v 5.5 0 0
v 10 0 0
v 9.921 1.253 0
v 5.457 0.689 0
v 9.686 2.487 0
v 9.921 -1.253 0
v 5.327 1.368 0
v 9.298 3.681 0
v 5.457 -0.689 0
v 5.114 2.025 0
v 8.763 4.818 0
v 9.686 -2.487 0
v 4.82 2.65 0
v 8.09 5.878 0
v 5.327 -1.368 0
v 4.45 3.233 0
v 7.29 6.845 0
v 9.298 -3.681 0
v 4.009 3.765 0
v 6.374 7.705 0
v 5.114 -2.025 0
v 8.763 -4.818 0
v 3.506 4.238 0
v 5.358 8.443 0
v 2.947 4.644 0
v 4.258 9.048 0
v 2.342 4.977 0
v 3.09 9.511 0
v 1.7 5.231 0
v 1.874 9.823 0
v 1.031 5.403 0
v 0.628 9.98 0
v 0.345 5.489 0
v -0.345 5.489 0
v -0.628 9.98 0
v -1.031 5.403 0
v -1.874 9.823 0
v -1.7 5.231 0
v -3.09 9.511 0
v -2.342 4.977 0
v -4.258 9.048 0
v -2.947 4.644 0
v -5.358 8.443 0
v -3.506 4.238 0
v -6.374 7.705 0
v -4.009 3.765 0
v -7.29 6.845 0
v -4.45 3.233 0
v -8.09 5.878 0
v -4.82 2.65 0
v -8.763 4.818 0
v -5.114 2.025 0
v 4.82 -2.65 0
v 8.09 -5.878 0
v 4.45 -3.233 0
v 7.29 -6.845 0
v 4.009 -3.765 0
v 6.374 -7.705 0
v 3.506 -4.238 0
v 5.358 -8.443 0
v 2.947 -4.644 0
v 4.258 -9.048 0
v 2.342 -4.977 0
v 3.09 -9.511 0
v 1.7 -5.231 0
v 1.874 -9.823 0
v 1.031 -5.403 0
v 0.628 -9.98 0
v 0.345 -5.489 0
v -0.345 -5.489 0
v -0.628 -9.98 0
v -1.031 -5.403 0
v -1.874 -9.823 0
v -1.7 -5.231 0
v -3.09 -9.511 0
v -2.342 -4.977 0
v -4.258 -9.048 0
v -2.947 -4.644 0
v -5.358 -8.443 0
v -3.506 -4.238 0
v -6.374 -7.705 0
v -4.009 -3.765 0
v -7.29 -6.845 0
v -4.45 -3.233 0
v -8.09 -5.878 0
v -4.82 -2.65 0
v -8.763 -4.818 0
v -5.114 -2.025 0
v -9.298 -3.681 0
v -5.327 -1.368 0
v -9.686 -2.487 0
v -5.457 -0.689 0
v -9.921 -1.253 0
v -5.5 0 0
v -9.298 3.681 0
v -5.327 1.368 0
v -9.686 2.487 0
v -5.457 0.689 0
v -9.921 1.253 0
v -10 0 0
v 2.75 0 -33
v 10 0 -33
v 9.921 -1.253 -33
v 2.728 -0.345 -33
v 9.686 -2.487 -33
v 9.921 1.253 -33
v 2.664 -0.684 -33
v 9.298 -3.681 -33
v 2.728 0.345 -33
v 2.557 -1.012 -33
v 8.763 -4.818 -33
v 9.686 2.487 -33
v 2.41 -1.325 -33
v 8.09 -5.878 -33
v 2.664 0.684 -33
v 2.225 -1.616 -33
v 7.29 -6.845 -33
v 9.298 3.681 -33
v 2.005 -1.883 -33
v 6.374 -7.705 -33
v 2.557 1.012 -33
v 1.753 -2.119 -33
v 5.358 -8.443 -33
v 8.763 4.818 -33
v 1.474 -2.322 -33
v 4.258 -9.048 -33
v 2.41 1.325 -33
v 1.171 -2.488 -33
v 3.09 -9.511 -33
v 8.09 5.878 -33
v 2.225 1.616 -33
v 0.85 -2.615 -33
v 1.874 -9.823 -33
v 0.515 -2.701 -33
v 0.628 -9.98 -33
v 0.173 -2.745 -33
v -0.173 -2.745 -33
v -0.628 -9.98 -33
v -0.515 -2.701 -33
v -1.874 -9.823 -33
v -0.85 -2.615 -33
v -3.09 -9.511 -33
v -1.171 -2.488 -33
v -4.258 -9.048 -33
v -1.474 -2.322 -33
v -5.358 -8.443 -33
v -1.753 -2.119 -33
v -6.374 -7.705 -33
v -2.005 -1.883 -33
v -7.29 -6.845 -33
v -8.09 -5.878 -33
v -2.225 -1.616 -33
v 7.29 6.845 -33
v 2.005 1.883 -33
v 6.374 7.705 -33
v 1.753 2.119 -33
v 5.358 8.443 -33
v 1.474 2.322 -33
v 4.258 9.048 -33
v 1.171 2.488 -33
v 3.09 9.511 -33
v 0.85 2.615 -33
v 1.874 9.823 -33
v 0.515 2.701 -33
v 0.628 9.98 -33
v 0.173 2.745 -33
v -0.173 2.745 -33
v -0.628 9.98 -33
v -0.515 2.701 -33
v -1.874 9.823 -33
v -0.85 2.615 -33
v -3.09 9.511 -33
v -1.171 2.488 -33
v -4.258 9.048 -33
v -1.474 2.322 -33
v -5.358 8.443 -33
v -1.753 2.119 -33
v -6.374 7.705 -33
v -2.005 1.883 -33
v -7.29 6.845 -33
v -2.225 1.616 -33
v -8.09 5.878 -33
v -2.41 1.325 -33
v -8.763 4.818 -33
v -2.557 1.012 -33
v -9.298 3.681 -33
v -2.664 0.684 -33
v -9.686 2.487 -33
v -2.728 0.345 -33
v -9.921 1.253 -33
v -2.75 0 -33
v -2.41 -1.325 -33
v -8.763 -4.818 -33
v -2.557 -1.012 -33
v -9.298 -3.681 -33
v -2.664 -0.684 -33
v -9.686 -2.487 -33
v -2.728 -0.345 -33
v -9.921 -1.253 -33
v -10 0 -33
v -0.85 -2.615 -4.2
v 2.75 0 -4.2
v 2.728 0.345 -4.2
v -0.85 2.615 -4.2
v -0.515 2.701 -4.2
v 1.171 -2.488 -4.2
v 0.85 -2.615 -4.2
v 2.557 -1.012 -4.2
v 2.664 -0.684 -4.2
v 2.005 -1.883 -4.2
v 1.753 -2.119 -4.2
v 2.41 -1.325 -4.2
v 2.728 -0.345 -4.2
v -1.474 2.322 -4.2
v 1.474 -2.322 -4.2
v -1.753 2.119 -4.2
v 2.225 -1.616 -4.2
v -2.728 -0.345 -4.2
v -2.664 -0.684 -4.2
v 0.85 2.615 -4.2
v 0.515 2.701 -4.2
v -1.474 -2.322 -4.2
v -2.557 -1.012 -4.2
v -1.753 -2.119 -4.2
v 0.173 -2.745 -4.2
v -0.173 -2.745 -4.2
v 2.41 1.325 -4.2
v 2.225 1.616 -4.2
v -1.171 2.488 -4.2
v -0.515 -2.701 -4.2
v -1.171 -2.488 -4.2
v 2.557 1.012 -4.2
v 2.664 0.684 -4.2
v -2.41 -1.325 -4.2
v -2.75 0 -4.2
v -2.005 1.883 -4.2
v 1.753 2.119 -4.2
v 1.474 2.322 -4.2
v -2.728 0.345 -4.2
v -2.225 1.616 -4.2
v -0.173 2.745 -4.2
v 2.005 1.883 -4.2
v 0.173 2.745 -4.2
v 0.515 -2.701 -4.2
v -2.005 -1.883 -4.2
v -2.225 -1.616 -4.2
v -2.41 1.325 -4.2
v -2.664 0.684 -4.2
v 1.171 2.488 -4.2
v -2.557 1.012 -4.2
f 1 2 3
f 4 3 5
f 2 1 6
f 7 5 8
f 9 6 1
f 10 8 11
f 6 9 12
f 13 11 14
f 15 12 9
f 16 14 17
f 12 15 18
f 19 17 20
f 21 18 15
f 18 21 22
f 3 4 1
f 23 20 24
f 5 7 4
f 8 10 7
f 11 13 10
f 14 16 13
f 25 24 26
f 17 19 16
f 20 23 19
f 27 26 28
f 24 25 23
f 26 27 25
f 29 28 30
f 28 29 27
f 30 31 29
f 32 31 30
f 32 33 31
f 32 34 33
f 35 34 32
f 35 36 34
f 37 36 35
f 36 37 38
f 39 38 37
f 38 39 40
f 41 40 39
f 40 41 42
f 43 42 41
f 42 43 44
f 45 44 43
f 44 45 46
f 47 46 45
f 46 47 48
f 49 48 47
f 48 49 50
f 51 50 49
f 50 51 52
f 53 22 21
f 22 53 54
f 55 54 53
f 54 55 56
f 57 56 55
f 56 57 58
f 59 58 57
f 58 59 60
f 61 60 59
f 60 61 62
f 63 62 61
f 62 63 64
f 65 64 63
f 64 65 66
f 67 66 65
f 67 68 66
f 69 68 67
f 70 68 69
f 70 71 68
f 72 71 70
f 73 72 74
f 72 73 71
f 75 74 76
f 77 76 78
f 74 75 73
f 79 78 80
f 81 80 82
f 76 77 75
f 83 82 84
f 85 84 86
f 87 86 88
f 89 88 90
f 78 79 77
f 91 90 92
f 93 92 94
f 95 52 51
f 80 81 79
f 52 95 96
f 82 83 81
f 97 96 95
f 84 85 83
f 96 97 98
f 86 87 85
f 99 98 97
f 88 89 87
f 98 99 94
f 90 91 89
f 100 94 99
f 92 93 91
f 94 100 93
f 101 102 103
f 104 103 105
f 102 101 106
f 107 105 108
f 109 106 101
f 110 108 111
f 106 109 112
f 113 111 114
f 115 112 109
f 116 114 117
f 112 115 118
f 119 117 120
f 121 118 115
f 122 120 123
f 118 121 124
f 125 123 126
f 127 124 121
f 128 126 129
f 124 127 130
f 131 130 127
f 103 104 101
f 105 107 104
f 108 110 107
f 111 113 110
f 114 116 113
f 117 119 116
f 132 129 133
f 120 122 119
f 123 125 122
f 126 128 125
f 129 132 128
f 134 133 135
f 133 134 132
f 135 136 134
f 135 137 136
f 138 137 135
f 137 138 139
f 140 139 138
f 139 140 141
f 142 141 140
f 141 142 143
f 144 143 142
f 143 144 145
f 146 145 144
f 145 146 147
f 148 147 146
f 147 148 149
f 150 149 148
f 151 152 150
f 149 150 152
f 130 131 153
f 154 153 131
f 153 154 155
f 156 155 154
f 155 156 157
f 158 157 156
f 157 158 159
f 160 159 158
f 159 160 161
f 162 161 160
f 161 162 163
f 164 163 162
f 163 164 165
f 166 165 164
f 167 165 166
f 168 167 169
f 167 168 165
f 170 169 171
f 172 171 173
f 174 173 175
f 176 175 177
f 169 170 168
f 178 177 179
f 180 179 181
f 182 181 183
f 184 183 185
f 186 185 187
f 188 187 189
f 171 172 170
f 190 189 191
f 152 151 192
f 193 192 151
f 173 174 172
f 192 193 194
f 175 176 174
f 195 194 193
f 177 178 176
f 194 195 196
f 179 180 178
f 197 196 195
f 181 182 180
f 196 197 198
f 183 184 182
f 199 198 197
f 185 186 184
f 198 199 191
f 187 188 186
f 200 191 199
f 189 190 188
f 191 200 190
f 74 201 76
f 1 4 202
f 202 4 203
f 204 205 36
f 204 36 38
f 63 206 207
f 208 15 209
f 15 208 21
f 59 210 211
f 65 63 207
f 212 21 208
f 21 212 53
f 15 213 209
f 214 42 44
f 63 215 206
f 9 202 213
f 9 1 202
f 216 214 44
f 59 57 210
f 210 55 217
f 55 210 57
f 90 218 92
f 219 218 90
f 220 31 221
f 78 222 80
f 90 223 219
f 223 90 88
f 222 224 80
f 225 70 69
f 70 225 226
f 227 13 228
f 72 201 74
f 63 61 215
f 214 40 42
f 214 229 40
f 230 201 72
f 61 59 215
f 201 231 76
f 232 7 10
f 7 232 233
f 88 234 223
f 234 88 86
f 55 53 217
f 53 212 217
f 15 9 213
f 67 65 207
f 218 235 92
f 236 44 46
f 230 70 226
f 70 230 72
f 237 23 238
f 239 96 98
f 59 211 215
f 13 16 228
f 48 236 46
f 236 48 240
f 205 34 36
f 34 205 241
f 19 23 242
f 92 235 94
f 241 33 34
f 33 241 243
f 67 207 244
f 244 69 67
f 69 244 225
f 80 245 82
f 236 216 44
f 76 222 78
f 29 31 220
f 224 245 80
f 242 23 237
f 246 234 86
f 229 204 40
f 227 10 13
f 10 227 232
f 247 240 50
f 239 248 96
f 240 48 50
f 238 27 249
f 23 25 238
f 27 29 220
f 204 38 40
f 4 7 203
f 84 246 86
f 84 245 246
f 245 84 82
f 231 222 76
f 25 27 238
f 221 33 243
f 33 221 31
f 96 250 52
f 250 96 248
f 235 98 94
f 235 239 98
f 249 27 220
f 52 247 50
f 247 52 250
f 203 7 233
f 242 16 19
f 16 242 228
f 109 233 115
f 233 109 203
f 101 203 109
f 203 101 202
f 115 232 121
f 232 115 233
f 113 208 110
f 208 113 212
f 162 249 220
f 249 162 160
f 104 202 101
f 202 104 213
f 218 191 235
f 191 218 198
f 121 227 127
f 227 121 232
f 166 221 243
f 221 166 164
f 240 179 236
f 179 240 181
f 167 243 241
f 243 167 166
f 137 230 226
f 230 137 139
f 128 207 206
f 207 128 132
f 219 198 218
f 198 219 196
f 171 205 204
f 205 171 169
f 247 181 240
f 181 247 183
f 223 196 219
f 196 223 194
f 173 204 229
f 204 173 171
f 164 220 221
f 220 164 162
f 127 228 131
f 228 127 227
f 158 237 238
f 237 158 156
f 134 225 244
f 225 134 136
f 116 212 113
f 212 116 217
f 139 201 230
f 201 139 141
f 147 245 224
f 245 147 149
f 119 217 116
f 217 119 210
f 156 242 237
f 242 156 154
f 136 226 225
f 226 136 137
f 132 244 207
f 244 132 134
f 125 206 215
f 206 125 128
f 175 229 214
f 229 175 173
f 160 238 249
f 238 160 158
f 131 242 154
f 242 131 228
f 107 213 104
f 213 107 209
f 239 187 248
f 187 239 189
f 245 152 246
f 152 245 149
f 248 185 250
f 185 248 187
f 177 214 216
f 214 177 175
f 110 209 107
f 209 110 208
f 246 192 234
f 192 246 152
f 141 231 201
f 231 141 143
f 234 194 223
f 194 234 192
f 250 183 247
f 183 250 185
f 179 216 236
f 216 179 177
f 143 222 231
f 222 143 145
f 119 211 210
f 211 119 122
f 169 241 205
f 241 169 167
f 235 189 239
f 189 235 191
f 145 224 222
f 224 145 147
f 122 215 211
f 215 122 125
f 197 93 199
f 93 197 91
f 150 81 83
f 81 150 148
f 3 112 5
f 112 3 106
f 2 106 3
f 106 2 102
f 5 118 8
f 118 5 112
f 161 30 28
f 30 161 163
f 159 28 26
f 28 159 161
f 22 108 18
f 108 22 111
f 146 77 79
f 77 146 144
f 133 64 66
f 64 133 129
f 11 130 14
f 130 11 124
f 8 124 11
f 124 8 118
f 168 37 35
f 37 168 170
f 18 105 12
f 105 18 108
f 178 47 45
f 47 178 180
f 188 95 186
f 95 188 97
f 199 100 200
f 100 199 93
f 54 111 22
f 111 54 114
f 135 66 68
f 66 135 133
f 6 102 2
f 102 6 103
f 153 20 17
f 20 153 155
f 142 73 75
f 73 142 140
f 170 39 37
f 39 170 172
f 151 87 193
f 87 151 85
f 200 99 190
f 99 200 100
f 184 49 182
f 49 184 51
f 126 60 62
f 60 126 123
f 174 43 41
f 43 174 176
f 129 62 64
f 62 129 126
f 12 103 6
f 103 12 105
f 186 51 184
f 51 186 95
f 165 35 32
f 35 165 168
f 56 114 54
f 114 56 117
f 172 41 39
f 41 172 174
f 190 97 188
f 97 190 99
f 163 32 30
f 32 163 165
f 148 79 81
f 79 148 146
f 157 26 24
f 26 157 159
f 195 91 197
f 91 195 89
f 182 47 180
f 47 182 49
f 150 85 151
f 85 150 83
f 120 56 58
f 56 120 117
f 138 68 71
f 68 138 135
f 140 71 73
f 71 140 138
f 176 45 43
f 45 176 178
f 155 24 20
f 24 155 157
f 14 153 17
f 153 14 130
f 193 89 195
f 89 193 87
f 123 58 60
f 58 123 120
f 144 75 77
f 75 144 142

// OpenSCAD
$fn = 50;


difference() {
	union() {
		translate(v = [0, 0, -33.0000000000]) {
			cylinder(h = 33, r = 10.0000000000);
		}
		cylinder(h = 0, r = 20.0000000000);
	}
	union() {
		translate(v = [0, 0, 0]) {
			rotate(a = [0, 0, 0]) {
				difference() {
					union() {
						#translate(v = [0, 0, -33.0000000000]) {
							cylinder(h = 33, r = 2.2500000000);
						}
						#translate(v = [0, 0, -4.2000000000]) {
							cylinder(h = 4.2000000000, r = 10.0000000000, r1 = 2.7500000000, r2 = 5.5000000000);
						}
						#translate(v = [0, 0, -33.0000000000]) {
							cylinder(h = 33, r = 2.7500000000);
						}
						#translate(v = [0, 0, -33.0000000000]) {
							cylinder(h = 33, r = 2.2500000000);
						}
					}
					union();
				}
			}
		}
	}
}
